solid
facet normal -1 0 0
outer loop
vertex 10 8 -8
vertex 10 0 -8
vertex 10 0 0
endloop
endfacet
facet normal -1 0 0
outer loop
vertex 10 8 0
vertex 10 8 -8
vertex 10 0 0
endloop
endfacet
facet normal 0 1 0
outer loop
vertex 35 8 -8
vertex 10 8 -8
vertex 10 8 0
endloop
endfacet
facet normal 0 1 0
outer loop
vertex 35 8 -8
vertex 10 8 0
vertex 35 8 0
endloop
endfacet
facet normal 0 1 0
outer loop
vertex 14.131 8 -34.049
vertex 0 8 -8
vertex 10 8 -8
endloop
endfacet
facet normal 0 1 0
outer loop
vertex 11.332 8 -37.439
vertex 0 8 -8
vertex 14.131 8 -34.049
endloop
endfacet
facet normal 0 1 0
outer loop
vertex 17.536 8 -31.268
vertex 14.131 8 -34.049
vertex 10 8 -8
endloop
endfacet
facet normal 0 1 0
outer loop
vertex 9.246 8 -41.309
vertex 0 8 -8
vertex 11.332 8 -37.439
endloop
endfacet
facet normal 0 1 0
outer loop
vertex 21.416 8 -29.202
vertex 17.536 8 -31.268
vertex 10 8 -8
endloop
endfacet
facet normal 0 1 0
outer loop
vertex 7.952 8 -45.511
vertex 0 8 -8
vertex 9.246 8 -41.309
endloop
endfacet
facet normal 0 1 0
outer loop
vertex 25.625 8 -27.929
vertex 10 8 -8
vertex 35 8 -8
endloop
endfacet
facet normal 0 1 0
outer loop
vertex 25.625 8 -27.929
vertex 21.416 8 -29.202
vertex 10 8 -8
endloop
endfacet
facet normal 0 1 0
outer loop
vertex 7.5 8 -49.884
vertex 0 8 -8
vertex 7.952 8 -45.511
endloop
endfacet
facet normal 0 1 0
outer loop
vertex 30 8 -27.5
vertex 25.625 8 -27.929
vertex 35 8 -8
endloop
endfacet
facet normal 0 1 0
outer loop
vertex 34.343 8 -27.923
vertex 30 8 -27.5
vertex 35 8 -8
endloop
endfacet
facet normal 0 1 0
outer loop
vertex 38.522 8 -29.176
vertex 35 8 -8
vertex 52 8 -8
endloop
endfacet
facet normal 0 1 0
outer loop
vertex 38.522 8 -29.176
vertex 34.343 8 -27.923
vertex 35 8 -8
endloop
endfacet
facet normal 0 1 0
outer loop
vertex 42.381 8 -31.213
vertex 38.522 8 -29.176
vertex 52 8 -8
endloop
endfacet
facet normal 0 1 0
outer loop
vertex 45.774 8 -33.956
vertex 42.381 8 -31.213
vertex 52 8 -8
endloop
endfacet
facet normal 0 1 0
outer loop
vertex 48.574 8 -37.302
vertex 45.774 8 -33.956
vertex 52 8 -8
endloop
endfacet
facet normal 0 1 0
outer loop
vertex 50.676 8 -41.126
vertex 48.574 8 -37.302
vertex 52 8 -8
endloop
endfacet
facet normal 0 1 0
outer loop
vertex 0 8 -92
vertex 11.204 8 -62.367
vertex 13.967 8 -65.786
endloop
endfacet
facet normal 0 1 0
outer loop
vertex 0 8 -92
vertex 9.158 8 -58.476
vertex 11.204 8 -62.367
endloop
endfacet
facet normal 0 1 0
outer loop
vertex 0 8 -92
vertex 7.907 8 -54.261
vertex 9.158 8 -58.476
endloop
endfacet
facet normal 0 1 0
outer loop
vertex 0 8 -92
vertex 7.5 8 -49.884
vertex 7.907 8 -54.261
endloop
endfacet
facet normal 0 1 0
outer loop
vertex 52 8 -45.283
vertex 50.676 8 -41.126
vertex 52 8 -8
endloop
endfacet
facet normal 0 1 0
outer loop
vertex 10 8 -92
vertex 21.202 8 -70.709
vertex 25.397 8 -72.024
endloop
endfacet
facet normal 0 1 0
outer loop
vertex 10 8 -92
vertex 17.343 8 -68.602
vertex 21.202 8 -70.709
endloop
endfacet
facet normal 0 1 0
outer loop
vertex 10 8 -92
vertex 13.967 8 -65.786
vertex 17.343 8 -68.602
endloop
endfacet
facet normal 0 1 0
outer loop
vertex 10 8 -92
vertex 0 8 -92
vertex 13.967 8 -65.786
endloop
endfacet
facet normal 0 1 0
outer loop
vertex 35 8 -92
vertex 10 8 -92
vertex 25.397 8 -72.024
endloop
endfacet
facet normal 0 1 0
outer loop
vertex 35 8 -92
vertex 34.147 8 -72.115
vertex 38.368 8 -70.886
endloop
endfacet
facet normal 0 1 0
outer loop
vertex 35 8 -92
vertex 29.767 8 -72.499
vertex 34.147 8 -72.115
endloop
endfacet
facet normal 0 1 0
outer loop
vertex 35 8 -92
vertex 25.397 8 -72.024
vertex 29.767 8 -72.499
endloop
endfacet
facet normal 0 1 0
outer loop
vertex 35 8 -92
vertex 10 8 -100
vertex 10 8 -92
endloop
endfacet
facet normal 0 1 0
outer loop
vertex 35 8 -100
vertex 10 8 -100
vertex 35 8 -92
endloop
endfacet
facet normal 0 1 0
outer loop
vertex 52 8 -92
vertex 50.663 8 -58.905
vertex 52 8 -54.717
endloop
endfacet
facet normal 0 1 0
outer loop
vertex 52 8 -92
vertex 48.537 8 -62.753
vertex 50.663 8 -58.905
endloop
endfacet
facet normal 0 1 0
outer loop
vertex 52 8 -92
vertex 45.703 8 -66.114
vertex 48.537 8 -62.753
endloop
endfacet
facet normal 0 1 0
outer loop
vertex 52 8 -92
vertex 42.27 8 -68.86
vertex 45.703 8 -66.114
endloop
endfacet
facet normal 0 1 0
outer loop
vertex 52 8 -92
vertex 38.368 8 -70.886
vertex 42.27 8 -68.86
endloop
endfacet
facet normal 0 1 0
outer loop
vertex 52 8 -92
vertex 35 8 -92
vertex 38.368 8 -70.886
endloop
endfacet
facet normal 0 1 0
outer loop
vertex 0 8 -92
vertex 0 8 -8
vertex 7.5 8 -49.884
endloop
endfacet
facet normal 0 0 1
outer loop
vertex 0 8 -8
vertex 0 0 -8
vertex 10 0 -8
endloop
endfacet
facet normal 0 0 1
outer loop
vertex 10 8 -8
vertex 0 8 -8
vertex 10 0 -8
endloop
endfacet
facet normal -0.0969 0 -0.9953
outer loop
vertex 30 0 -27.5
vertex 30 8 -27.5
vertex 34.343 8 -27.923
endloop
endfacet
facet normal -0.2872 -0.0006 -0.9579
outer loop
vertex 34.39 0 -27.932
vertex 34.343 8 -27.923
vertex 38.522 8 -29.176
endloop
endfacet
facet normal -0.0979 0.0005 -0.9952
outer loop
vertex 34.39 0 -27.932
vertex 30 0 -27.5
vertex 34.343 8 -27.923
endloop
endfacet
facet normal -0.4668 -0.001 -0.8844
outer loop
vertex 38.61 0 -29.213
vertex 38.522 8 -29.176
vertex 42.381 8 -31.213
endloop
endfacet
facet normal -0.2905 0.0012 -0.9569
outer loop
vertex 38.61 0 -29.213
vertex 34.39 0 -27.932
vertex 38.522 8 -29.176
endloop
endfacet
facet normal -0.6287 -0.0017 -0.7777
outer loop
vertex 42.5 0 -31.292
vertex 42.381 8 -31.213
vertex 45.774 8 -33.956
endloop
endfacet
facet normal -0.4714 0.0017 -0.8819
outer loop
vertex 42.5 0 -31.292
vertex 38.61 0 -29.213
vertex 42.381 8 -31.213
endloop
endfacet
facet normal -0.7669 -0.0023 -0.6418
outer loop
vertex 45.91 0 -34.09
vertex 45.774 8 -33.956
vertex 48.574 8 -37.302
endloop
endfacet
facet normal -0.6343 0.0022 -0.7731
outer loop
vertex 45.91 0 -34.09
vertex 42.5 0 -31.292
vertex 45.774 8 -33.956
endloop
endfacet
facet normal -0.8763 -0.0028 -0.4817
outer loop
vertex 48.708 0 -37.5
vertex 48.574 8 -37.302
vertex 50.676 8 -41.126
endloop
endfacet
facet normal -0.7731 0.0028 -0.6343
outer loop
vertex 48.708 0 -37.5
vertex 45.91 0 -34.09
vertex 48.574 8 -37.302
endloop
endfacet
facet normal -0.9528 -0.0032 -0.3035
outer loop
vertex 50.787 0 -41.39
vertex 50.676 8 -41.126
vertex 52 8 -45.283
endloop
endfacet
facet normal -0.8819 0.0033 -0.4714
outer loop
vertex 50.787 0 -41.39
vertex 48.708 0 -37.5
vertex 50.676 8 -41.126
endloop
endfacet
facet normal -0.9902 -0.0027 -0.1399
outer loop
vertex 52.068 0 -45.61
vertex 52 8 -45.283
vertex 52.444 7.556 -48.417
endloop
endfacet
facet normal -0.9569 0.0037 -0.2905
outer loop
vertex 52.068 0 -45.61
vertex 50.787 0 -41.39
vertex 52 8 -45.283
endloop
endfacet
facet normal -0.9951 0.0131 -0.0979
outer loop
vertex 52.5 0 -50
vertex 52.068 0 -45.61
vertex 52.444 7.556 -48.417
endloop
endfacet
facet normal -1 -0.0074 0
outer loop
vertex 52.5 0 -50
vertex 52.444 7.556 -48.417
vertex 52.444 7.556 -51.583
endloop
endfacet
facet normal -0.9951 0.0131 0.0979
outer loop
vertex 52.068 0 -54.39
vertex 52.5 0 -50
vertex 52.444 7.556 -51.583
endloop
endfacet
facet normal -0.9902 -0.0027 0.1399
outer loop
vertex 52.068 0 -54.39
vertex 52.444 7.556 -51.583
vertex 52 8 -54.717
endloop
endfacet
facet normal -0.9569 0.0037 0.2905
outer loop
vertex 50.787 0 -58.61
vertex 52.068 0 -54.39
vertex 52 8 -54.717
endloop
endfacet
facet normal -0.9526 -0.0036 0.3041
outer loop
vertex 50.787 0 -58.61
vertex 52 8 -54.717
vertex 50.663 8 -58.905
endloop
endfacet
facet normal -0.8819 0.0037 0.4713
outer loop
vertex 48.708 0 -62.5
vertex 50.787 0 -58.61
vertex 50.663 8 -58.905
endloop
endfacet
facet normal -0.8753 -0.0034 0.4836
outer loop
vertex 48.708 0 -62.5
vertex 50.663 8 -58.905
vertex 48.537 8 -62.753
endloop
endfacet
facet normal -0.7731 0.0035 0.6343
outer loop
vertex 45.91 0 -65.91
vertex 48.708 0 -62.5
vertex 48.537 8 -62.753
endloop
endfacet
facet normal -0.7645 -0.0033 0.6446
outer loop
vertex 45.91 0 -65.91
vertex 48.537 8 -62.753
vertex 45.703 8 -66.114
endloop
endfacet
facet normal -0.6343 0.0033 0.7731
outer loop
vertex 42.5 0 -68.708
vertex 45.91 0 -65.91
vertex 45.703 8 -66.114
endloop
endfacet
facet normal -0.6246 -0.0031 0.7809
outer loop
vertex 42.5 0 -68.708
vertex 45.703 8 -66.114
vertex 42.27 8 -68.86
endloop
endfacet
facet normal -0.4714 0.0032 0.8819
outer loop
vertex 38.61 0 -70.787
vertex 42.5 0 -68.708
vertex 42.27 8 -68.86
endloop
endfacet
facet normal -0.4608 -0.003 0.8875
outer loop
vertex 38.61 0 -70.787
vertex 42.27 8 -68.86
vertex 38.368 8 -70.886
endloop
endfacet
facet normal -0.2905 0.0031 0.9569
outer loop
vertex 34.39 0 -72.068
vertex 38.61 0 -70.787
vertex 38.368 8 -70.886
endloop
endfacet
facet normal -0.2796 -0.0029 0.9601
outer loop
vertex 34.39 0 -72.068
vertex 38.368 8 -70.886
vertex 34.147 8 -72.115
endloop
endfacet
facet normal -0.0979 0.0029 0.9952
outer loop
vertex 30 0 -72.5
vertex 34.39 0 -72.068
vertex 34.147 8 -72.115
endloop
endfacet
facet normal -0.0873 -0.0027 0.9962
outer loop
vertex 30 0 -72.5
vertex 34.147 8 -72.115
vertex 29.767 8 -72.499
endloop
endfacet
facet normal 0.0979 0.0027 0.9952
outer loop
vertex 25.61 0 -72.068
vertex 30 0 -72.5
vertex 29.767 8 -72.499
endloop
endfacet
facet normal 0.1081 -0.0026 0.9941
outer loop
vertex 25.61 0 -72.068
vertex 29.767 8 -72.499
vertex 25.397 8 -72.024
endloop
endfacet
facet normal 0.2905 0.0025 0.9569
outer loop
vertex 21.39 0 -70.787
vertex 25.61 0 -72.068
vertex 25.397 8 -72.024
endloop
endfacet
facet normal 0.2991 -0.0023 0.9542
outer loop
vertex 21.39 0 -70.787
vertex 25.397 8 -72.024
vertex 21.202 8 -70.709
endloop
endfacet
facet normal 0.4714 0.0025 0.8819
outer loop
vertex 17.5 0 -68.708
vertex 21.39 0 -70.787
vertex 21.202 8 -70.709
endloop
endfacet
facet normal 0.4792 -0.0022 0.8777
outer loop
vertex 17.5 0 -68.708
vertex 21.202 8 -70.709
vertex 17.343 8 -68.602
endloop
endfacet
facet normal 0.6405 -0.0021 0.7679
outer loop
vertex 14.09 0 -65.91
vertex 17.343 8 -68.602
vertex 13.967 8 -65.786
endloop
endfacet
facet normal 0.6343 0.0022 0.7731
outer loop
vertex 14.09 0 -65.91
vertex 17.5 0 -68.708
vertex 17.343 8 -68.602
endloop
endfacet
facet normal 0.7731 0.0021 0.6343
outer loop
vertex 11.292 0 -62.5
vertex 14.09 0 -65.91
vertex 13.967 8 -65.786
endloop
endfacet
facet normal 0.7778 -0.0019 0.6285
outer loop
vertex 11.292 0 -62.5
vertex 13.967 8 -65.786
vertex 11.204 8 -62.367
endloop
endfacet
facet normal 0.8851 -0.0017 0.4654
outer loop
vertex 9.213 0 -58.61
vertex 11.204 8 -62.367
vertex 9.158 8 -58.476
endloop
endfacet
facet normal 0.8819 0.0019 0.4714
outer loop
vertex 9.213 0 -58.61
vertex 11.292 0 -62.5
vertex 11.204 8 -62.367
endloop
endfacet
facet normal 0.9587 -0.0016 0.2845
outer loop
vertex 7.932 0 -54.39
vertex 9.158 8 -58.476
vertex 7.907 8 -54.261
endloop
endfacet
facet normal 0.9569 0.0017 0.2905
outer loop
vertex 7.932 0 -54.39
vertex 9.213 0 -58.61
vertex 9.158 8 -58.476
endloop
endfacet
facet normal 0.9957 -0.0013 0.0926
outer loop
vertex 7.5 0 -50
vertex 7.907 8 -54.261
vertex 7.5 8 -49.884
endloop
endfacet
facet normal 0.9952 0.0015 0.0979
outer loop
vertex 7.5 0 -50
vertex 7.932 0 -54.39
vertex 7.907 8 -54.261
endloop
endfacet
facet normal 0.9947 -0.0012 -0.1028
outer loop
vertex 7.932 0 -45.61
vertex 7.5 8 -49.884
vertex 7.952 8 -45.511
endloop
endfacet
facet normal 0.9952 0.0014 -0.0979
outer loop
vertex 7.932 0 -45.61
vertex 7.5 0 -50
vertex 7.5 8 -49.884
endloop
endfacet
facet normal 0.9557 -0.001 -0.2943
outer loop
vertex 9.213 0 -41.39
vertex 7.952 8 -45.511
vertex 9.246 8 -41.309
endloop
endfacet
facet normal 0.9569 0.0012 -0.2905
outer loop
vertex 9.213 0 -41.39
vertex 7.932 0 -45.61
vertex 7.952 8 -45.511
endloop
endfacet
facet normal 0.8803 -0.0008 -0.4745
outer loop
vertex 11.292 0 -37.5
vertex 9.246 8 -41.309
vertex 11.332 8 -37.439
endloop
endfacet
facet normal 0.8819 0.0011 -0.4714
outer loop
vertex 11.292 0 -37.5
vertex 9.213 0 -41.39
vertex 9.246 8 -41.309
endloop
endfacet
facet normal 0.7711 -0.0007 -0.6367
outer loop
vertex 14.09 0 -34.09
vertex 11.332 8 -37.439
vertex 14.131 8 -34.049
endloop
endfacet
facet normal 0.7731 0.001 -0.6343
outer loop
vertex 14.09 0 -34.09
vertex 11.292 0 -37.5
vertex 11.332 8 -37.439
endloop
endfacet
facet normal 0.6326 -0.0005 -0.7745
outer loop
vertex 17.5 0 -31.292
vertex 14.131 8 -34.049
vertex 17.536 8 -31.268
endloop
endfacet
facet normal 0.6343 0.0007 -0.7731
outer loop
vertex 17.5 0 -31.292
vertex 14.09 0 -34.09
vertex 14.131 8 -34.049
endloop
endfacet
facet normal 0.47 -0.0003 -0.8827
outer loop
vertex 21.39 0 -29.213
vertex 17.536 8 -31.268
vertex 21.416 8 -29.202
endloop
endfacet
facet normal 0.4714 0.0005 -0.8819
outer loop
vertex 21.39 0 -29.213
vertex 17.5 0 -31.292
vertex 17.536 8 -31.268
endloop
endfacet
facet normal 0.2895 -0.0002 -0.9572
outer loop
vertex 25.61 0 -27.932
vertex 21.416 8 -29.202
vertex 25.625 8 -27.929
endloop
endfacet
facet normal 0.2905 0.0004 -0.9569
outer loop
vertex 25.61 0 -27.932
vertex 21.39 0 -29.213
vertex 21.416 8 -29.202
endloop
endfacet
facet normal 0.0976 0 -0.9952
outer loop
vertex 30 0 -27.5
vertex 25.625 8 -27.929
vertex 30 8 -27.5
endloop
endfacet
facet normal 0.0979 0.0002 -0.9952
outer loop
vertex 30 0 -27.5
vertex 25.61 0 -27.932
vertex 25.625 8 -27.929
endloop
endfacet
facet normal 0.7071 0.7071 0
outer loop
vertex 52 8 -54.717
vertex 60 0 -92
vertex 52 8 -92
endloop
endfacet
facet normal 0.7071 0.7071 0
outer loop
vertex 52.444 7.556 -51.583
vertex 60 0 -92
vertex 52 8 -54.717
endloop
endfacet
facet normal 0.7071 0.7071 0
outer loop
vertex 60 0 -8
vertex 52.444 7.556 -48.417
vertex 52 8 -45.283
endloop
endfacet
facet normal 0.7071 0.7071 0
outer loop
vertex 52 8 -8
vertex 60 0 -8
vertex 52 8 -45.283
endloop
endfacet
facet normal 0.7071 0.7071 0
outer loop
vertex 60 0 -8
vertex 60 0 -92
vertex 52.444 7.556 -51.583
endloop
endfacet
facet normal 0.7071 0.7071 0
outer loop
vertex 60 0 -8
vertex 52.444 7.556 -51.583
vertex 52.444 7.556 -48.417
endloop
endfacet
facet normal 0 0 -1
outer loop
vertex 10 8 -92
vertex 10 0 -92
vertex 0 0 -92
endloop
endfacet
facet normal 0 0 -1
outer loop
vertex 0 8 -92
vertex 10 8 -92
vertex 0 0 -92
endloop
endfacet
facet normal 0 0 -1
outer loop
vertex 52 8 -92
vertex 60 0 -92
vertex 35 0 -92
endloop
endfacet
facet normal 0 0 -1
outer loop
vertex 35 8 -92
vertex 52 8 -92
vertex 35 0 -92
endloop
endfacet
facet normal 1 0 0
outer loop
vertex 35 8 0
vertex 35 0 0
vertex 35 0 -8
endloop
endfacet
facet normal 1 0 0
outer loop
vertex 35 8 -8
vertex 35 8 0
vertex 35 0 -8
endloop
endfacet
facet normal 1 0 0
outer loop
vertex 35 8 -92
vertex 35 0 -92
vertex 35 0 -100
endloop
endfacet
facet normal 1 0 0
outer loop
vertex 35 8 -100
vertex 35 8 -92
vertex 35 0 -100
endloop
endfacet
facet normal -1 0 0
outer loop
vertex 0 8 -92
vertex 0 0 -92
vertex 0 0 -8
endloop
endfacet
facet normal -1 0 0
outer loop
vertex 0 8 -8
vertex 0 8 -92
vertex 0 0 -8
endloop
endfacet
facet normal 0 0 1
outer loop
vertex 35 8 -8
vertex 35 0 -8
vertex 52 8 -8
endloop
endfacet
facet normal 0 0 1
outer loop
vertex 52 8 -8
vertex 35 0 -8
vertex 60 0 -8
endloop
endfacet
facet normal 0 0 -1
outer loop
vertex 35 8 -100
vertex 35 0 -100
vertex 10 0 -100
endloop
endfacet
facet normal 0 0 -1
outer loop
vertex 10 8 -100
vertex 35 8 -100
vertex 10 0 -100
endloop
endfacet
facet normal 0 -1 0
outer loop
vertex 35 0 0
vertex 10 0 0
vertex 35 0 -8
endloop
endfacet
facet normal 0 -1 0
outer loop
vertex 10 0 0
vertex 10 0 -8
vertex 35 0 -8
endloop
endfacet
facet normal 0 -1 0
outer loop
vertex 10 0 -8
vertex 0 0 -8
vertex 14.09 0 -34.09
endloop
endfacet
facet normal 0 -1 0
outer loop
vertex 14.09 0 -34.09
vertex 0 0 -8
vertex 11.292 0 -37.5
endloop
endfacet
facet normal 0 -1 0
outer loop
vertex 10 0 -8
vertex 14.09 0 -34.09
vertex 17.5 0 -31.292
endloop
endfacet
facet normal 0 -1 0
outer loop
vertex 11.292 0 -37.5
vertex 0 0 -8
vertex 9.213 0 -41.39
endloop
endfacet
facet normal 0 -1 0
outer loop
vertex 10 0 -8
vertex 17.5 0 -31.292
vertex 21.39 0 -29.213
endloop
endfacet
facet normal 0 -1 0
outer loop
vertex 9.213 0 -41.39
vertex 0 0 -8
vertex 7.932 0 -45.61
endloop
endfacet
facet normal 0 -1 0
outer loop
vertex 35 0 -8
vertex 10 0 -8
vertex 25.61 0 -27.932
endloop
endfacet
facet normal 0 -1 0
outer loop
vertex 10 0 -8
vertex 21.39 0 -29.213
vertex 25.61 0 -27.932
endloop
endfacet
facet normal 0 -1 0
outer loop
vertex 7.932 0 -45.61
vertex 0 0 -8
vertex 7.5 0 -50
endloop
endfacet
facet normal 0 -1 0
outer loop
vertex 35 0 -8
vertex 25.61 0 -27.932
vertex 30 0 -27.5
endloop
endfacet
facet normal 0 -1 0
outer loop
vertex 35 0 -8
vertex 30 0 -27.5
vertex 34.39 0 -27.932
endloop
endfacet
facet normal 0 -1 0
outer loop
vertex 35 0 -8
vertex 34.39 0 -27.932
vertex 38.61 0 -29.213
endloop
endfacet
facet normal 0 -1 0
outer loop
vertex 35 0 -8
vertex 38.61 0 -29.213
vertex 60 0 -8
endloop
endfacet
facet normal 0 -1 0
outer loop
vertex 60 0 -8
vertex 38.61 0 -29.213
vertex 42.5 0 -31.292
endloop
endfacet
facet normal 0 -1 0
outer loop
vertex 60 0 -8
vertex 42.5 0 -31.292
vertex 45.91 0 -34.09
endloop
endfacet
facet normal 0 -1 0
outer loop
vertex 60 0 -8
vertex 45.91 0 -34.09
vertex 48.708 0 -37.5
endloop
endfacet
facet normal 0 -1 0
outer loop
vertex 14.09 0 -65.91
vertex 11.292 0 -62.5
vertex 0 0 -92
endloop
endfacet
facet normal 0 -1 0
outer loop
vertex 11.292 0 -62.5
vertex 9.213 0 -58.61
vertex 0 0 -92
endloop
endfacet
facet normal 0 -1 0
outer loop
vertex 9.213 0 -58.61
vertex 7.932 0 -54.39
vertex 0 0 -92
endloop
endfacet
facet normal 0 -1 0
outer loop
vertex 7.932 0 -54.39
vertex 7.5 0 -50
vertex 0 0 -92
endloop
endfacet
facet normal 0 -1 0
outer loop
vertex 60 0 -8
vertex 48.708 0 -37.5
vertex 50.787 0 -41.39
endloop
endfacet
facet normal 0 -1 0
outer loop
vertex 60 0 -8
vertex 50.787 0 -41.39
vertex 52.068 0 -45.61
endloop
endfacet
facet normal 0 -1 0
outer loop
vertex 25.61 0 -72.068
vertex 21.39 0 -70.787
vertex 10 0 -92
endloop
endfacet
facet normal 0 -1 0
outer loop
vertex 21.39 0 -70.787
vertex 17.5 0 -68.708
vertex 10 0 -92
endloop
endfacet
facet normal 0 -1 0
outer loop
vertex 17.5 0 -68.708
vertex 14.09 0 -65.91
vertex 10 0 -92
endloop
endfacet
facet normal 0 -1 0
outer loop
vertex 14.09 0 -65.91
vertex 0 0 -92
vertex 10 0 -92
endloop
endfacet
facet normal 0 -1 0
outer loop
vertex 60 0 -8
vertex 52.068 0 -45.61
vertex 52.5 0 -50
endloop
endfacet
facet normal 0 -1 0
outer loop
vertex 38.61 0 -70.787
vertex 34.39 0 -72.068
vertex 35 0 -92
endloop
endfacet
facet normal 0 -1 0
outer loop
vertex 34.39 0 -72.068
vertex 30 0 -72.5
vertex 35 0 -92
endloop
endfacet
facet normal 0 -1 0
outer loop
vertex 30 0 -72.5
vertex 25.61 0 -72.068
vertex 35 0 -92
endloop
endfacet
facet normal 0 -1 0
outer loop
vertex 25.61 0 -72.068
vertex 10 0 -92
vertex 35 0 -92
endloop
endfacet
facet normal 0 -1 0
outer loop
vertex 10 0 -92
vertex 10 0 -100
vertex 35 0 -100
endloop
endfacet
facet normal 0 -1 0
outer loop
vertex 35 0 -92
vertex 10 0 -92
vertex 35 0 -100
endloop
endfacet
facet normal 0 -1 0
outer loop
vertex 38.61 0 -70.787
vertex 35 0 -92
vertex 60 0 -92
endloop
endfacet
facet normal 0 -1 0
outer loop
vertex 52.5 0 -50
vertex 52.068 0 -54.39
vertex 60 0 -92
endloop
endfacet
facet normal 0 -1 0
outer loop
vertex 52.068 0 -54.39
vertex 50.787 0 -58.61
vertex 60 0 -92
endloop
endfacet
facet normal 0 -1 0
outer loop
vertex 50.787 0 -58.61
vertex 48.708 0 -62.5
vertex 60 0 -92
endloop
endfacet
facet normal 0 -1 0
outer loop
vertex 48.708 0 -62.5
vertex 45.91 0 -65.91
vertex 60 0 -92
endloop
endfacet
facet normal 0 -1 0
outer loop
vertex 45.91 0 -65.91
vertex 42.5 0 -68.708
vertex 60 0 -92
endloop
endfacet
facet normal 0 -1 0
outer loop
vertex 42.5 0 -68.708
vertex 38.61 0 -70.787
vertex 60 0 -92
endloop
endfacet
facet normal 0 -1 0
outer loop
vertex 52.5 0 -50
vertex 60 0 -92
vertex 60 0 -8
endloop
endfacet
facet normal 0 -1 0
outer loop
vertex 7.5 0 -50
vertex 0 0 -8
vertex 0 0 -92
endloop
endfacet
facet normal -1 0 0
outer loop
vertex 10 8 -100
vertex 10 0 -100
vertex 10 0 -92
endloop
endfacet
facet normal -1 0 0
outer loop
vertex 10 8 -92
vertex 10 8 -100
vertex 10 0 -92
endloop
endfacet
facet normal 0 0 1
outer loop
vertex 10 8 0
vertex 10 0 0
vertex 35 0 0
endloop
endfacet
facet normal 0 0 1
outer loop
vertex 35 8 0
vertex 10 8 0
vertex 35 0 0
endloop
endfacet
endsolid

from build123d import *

# Parameters (mm, degrees)
SKETCH1_R           = 22.5
BOSS_EXTRUDE1_DEPTH = 8
CUT_EXTRUDE4_DEPTH  = 111.127199183


with BuildPart() as part:
    # Sketch1 → Boss-Extrude1 (new body)
    with BuildSketch(Plane(origin=(0, 0, 0), x_dir=(1, 0, 0), z_dir=(0, 1, 0))):
        Polygon((10, 0), (35, 0), (35, 8), (60, 8), (60, 92), (35, 92), (35, 100), (10, 100), (10, 92), (0, 92), (0, 8), (10, 8), align=None)
        with Locations(Location((30, 50, 0), (0, 0, 270))):
            Circle(SKETCH1_R, mode=Mode.SUBTRACT)
    extrude(amount=BOSS_EXTRUDE1_DEPTH)

    # Sketch7 → Cut-Extrude4 (cut, through all)
    with BuildSketch(Plane.XY.offset(-8)):
        Polygon((60, 0), (52, 8), (60, 8), align=None)
    extrude(amount=-CUT_EXTRUDE4_DEPTH, mode=Mode.SUBTRACT)


solid = part.part
